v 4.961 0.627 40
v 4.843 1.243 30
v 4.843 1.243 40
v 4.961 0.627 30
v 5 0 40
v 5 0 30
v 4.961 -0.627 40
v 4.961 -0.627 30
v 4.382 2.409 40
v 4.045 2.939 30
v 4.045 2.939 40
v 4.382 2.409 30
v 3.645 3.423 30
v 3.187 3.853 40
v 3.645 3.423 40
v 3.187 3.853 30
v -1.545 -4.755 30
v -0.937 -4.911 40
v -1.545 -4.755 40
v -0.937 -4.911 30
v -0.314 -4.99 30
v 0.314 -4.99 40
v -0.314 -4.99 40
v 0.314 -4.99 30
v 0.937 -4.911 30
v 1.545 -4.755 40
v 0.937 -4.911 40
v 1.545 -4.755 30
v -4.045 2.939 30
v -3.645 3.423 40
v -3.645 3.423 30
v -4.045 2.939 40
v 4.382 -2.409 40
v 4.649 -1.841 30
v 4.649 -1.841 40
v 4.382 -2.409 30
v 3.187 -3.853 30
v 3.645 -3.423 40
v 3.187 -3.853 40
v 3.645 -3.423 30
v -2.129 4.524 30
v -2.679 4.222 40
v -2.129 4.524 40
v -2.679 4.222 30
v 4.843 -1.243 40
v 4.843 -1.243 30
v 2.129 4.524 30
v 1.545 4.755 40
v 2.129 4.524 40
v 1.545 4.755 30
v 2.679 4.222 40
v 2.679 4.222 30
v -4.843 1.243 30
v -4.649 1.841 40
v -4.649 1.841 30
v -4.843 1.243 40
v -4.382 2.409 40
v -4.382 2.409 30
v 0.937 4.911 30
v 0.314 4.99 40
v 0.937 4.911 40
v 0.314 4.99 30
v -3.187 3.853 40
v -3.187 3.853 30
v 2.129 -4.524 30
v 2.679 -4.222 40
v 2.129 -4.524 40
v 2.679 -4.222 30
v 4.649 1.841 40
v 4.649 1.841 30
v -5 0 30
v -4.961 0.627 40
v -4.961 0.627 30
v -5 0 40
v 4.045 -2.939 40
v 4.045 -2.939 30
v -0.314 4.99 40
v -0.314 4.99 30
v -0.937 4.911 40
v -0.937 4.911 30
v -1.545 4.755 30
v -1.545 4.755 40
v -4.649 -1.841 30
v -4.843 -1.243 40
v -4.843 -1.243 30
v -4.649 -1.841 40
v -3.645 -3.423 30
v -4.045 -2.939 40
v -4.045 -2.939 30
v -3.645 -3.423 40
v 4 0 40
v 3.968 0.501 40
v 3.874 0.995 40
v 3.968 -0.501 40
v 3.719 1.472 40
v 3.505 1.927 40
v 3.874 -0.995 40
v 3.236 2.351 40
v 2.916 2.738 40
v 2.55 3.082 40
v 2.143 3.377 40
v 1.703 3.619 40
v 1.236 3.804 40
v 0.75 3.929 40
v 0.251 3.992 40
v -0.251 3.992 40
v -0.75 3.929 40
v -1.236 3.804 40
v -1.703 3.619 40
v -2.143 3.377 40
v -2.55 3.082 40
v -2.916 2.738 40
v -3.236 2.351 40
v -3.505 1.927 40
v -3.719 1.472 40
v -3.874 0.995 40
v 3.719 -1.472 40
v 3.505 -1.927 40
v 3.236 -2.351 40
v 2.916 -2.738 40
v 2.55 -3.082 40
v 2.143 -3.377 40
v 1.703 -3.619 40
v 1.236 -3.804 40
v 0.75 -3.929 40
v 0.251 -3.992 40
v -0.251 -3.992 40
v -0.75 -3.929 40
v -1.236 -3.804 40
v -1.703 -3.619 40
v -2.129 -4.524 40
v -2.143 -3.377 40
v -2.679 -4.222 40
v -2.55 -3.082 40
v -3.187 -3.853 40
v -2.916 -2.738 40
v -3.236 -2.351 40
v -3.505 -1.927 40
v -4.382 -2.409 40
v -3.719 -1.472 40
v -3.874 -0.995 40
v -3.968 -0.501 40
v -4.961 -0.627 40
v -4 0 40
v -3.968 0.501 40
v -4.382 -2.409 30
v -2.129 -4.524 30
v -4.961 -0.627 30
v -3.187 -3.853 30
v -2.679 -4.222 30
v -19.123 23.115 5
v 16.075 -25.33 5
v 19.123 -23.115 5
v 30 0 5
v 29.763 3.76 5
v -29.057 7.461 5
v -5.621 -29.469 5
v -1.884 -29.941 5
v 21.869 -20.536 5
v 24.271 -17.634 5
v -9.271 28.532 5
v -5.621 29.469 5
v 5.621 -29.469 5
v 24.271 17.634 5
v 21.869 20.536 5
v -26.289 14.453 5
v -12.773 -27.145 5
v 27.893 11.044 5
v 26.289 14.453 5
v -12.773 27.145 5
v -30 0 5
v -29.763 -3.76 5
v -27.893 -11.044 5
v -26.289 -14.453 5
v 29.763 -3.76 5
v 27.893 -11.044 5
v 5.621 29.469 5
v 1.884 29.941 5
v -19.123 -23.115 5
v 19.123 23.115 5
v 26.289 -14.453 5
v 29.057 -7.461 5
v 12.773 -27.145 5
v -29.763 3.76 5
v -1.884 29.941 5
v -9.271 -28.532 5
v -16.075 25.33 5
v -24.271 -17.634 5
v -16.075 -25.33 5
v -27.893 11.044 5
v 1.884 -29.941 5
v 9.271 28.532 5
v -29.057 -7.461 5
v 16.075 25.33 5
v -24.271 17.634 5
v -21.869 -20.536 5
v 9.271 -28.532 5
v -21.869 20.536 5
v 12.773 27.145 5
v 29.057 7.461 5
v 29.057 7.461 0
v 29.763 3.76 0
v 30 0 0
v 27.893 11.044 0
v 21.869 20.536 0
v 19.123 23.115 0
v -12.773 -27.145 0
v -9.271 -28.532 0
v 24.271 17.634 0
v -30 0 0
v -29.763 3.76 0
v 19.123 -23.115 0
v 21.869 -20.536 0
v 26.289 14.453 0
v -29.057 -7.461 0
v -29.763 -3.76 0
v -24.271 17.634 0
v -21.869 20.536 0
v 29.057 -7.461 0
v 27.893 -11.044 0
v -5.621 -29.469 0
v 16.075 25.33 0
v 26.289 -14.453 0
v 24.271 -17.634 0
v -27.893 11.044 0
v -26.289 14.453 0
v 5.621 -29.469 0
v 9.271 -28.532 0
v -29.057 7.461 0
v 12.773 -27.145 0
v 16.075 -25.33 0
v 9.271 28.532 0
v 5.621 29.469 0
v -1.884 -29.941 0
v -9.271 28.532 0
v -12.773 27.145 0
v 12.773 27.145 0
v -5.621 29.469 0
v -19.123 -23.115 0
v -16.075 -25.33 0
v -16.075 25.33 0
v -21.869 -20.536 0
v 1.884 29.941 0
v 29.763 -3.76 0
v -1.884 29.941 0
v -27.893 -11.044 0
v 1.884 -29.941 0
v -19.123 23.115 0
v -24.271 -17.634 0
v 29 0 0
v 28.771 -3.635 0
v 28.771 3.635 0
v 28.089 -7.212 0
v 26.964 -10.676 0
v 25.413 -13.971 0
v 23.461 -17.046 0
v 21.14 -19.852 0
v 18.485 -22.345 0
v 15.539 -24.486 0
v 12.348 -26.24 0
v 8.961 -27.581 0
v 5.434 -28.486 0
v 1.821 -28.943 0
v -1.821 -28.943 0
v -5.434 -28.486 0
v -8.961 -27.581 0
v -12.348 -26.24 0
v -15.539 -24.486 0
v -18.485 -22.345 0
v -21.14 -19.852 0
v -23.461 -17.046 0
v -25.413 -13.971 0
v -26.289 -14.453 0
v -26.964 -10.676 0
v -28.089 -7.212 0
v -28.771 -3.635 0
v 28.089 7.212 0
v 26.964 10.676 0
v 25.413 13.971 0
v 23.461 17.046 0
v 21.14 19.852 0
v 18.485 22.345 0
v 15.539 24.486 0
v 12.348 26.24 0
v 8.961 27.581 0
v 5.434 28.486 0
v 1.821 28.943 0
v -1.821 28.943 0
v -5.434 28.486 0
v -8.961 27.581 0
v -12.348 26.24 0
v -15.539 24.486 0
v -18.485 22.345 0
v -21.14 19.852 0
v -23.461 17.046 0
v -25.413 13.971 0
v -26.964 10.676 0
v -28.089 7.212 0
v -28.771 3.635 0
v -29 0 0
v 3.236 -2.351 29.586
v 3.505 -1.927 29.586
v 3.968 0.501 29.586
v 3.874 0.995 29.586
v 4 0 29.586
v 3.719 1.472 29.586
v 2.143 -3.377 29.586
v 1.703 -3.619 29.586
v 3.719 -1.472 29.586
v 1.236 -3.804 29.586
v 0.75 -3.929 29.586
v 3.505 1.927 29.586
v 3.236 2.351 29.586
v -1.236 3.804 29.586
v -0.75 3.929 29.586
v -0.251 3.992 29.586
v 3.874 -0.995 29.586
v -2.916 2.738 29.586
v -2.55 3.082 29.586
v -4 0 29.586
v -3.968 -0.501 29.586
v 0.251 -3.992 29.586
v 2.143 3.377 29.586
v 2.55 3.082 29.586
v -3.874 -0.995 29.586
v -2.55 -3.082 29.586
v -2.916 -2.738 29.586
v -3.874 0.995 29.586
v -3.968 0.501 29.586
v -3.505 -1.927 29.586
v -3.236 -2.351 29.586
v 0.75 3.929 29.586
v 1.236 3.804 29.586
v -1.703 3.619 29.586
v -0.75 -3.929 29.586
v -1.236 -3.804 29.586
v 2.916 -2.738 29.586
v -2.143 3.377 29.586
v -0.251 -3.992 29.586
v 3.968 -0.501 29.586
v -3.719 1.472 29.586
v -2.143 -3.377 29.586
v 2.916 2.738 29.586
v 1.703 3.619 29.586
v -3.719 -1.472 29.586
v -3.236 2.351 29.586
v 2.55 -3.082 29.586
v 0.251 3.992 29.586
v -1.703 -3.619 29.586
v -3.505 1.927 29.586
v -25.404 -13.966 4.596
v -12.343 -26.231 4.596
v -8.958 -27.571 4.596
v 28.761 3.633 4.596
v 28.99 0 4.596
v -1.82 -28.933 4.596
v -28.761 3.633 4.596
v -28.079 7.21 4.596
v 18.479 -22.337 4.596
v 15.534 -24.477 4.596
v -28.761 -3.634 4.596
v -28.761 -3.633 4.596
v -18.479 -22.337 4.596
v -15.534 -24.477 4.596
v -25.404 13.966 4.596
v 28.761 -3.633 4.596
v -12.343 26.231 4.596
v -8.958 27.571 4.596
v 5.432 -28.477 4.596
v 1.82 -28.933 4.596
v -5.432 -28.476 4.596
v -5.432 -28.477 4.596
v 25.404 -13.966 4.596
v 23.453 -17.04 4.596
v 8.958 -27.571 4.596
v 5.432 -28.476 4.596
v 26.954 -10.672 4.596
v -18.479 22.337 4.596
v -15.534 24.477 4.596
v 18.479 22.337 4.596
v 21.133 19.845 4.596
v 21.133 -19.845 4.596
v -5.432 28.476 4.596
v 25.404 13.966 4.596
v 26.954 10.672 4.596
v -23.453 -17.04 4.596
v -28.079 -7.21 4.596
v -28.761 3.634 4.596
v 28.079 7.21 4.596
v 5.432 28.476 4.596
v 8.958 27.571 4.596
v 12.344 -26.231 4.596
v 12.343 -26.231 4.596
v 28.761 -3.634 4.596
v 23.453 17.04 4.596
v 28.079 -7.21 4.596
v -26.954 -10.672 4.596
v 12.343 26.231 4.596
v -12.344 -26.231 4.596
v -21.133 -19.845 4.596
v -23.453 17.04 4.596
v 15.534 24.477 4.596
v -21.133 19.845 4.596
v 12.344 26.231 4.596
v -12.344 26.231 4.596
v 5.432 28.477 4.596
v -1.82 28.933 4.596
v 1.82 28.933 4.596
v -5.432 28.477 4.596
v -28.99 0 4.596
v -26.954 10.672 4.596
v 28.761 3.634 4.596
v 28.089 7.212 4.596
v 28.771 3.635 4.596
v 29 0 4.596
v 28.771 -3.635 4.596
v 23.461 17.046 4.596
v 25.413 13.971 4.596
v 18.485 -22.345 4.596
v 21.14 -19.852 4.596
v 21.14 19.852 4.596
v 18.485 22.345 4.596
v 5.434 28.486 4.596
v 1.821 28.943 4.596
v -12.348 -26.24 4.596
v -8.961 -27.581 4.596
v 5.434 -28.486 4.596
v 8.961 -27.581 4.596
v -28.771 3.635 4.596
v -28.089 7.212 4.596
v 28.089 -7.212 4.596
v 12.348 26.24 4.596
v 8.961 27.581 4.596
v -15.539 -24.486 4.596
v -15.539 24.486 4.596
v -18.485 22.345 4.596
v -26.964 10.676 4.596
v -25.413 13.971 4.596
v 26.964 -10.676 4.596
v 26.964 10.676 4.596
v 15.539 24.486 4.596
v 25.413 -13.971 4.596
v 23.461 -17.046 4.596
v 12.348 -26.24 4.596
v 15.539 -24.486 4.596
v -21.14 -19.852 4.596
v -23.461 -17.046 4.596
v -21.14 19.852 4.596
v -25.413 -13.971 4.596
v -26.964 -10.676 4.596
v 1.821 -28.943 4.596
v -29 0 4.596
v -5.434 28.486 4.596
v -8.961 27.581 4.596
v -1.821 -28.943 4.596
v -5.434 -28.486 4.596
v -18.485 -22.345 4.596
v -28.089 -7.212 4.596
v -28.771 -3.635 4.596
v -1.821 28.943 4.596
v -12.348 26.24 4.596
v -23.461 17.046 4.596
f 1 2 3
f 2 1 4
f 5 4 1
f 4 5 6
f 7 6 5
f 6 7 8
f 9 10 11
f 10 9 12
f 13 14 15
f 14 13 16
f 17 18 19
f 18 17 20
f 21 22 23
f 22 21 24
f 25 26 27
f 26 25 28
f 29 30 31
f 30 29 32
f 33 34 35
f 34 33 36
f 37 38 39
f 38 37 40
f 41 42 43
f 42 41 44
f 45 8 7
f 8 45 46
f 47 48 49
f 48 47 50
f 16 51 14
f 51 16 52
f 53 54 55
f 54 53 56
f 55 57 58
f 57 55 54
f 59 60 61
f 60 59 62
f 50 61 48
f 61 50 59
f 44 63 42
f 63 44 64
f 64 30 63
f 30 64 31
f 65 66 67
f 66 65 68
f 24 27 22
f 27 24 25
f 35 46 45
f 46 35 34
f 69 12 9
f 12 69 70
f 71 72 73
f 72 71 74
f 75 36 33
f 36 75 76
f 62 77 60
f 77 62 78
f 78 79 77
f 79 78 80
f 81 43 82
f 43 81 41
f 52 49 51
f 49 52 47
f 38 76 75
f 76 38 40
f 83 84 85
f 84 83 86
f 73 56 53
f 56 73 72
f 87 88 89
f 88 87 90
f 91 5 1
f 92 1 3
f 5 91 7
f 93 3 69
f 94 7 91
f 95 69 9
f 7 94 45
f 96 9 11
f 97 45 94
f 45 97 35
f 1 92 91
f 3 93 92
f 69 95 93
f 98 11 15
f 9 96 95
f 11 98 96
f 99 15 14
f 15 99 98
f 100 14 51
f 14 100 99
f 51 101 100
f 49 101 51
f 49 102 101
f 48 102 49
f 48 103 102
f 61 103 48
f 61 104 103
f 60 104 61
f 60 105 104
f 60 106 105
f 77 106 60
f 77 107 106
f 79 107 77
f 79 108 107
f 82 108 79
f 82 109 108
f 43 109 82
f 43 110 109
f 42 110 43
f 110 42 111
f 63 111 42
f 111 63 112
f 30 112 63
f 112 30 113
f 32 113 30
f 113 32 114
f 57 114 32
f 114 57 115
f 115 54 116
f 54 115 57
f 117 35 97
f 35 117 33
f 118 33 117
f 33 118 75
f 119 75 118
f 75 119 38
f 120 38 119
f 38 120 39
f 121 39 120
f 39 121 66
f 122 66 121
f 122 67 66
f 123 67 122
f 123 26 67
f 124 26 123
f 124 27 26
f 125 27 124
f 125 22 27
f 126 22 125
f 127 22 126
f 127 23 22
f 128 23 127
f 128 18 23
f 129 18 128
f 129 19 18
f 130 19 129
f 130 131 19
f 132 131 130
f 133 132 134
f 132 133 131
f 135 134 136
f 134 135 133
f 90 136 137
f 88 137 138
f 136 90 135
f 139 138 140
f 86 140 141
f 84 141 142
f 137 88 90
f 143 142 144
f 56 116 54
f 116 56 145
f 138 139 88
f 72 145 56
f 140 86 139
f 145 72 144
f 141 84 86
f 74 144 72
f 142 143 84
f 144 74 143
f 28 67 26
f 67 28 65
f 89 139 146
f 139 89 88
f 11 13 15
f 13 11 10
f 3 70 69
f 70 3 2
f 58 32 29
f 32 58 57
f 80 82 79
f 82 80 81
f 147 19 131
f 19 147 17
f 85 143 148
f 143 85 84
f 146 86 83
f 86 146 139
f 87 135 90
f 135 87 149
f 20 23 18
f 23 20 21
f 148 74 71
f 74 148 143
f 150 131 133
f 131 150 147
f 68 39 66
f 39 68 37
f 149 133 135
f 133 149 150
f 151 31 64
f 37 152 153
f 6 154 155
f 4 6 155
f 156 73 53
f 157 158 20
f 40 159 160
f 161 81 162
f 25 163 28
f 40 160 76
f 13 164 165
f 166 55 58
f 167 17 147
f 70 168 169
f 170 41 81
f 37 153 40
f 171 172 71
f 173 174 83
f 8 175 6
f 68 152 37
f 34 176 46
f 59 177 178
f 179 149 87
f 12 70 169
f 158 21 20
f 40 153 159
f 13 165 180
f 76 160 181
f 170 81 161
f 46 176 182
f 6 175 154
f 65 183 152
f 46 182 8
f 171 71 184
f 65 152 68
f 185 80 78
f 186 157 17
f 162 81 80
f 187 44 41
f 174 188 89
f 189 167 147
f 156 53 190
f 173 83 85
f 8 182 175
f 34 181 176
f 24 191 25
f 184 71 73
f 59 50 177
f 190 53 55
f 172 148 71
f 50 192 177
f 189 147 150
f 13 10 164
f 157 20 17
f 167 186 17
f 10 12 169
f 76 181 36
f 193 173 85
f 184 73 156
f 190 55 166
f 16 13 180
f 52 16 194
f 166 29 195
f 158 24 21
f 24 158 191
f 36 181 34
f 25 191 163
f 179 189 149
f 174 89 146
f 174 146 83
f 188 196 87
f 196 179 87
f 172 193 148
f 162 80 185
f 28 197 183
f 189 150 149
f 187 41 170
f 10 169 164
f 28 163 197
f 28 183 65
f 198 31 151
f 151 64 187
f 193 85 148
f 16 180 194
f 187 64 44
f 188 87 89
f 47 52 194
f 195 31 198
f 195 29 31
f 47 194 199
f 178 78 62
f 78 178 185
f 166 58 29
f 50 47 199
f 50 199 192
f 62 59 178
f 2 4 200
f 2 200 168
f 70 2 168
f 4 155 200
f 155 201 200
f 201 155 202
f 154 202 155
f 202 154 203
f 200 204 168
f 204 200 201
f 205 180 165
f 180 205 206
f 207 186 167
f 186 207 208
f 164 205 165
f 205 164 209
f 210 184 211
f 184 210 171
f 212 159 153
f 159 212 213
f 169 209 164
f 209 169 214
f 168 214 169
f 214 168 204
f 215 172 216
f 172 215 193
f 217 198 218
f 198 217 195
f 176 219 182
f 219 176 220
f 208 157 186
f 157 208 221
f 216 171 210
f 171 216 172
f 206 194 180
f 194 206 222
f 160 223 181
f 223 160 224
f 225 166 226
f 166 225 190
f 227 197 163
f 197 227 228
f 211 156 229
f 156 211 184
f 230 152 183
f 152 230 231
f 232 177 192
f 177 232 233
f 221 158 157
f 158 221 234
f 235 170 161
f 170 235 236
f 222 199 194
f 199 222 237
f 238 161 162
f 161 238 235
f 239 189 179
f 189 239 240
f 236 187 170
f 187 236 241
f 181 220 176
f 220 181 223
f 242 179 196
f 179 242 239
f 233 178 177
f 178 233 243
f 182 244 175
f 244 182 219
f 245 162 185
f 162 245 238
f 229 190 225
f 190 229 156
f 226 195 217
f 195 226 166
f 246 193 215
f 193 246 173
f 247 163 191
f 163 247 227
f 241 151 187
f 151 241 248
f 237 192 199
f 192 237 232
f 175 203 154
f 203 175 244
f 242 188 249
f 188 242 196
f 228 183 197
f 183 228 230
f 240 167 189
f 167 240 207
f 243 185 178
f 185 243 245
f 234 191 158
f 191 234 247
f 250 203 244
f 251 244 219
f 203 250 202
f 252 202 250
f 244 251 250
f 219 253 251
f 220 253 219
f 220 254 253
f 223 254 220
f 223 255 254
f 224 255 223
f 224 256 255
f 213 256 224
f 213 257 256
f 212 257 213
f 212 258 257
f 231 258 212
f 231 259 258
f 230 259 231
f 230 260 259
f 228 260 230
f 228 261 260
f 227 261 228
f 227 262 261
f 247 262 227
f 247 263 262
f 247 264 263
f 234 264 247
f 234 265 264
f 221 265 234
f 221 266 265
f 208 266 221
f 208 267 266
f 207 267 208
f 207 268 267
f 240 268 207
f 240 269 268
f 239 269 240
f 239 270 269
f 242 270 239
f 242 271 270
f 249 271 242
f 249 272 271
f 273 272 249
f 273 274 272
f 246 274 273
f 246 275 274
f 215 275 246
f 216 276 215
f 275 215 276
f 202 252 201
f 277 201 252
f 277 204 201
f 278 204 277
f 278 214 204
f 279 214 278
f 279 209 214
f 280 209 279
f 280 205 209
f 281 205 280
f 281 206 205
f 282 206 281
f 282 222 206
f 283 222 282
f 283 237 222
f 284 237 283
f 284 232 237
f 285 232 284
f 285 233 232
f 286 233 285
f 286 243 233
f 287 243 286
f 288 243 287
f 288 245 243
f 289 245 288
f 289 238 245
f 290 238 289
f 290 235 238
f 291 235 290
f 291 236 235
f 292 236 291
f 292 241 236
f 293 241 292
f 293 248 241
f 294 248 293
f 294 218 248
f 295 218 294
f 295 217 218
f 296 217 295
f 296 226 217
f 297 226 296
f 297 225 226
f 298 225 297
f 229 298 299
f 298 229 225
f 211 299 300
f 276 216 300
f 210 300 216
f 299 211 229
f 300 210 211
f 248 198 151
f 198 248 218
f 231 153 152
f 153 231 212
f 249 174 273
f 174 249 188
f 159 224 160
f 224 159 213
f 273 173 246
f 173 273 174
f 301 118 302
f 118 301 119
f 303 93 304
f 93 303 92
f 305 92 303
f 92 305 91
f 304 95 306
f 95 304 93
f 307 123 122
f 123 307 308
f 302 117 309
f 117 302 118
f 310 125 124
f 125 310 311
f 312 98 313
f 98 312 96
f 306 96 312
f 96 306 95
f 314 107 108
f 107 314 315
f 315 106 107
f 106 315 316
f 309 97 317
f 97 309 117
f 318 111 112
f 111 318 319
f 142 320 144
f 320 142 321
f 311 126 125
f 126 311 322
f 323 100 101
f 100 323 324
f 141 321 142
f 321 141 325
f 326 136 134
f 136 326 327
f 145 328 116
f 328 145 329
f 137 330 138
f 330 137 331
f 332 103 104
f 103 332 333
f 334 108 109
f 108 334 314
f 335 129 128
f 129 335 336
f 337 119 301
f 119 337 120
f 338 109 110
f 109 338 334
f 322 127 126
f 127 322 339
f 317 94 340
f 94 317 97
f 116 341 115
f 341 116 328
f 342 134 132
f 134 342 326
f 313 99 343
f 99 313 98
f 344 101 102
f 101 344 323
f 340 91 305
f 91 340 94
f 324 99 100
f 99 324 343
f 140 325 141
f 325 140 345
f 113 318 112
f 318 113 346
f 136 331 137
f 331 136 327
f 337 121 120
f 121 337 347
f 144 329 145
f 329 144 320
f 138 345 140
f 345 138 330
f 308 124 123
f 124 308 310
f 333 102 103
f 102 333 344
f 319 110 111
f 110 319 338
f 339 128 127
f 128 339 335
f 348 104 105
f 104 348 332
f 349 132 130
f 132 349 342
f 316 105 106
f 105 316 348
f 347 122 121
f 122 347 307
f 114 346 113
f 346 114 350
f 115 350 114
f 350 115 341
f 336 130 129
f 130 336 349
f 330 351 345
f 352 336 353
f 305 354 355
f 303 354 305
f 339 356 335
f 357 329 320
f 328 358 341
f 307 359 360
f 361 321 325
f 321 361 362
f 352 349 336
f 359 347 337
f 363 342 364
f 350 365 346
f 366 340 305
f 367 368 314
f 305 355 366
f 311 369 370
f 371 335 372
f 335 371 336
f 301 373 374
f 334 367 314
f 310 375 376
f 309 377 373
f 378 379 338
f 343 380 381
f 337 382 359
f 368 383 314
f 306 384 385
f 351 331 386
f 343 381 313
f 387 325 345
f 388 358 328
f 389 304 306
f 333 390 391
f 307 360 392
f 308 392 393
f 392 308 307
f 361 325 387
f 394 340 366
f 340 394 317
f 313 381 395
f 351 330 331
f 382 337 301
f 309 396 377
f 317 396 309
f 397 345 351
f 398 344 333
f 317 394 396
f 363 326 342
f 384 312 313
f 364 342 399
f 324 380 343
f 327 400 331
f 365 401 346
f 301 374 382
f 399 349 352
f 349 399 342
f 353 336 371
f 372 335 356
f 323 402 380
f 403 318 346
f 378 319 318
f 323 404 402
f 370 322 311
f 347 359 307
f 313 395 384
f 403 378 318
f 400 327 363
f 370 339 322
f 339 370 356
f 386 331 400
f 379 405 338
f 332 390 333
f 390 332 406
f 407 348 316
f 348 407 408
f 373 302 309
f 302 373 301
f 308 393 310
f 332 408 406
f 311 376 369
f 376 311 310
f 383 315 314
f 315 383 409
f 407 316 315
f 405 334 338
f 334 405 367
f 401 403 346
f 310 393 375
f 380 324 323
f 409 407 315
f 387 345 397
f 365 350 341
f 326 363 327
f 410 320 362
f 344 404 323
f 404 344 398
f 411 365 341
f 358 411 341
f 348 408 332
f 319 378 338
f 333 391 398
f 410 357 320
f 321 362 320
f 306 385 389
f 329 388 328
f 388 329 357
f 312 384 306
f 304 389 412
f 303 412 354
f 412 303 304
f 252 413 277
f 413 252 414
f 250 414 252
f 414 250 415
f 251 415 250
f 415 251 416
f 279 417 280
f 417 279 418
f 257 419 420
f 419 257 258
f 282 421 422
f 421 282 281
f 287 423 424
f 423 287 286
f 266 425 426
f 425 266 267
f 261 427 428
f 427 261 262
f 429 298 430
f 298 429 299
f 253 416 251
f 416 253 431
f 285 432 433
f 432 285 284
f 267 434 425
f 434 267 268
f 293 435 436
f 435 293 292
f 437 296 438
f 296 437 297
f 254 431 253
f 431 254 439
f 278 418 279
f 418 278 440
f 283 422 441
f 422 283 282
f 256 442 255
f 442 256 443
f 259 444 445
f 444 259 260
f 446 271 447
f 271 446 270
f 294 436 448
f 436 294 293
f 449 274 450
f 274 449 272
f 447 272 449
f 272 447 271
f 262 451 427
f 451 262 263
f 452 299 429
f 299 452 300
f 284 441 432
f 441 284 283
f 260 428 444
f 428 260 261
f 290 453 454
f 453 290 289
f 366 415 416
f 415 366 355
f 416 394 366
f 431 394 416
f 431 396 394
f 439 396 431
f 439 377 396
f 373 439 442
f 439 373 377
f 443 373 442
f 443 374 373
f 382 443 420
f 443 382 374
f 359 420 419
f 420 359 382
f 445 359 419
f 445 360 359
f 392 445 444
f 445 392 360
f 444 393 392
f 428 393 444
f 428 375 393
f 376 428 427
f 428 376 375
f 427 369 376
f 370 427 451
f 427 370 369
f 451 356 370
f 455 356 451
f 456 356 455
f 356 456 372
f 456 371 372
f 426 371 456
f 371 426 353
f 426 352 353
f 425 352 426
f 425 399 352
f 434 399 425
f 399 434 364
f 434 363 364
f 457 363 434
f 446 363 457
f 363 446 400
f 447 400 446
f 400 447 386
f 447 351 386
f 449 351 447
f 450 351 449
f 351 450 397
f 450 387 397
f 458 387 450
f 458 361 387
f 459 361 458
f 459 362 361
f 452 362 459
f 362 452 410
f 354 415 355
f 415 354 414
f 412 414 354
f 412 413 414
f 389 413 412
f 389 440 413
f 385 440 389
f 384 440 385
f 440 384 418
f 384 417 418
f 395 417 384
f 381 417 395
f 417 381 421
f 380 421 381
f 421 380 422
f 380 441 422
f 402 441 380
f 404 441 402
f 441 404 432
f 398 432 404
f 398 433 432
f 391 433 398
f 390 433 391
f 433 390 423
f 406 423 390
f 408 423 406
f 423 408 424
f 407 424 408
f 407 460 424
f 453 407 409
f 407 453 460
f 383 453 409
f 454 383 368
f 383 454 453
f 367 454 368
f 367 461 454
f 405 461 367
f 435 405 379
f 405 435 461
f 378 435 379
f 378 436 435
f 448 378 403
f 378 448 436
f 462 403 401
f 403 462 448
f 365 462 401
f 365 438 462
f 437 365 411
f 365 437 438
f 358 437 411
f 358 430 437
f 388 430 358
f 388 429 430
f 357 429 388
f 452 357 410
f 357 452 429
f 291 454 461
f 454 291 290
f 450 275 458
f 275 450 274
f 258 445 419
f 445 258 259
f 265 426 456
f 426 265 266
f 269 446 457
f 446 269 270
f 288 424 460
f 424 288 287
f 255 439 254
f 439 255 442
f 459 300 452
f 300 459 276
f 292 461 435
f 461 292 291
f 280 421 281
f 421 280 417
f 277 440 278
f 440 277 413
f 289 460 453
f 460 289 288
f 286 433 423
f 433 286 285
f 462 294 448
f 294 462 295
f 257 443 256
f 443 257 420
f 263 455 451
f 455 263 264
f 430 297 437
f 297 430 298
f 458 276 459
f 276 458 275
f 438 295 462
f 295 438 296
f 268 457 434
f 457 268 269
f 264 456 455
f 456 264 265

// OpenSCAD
// preview[view:south, tilt:top diagonal]

//*********Declaration of customization variables************

//What outer diameter should the large opening have?
Large_End_Diameter = 60;

//What outer diameter should the small opening have?
Small_End_Diameter = 10;

//How thick should the walls be?
Wall_Thickness = 1; // [1:5]

//What's the overall height of the funnel?
Funnel_Height = 40;

//How tall should the band on the top be before the funnel begins?
Top_Band = 5;

//How long should the spout on the bottom be after the funnel ends?
Bottom_Spout_Length = 10;

//**********Assignment of customization vars to original scad vars***

spout_or = Small_End_Diameter/2;  //outer radius of bottom opening / spout
wall = Wall_Thickness; //wall thickness
flare_percentage = Large_End_Diameter / Small_End_Diameter * 100; // ratio of funnel opening (top) to spout (bottom), expressed as percentage
height = Funnel_Height; //total height
bottom_band=Bottom_Spout_Length;

res = 100/2; //resolution for cylinders
plane = 0.01/1;

//**********calculated variables*******************

spout_ir = spout_or - wall;
top_or = spout_or*flare_percentage/100;
top_ir = top_or - wall;

h1 = bottom_band;
h2 = height - Top_Band;
funnel_rise = height - bottom_band - Top_Band;
hi_adjust_ang = atan((top_or-spout_or)/funnel_rise)/2;
hi_adjust = wall*tan(hi_adjust_ang);

//**********begin build****************************

translate([0,0,height])mirror([0,0,1])difference(){

//**********outer shape****************************

union(){

cylinder(h=bottom_band,r=spout_or,$fn=res);
translate([0,0,h1])cylinder(h=funnel_rise,r1=spout_or,r2=top_or,$fn=res);
translate([0,0,h2])cylinder(h=Top_Band,r=top_or,$fn=res);

}

//**********inner shape****************************

union(){

cylinder(h=bottom_band+plane+hi_adjust,r=spout_ir,$fn=res);
translate([0,0,h1+hi_adjust])cylinder(h=funnel_rise,r1=spout_ir,r2=top_ir,$fn=res);
translate([0,0,h2+hi_adjust-plane])cylinder(h=Top_Band+hi_adjust+plane,r=top_ir,$fn=res);

//cube([top_or+1,top_or+1,height+1]); //cut for inspection of inner geometry

}

}
